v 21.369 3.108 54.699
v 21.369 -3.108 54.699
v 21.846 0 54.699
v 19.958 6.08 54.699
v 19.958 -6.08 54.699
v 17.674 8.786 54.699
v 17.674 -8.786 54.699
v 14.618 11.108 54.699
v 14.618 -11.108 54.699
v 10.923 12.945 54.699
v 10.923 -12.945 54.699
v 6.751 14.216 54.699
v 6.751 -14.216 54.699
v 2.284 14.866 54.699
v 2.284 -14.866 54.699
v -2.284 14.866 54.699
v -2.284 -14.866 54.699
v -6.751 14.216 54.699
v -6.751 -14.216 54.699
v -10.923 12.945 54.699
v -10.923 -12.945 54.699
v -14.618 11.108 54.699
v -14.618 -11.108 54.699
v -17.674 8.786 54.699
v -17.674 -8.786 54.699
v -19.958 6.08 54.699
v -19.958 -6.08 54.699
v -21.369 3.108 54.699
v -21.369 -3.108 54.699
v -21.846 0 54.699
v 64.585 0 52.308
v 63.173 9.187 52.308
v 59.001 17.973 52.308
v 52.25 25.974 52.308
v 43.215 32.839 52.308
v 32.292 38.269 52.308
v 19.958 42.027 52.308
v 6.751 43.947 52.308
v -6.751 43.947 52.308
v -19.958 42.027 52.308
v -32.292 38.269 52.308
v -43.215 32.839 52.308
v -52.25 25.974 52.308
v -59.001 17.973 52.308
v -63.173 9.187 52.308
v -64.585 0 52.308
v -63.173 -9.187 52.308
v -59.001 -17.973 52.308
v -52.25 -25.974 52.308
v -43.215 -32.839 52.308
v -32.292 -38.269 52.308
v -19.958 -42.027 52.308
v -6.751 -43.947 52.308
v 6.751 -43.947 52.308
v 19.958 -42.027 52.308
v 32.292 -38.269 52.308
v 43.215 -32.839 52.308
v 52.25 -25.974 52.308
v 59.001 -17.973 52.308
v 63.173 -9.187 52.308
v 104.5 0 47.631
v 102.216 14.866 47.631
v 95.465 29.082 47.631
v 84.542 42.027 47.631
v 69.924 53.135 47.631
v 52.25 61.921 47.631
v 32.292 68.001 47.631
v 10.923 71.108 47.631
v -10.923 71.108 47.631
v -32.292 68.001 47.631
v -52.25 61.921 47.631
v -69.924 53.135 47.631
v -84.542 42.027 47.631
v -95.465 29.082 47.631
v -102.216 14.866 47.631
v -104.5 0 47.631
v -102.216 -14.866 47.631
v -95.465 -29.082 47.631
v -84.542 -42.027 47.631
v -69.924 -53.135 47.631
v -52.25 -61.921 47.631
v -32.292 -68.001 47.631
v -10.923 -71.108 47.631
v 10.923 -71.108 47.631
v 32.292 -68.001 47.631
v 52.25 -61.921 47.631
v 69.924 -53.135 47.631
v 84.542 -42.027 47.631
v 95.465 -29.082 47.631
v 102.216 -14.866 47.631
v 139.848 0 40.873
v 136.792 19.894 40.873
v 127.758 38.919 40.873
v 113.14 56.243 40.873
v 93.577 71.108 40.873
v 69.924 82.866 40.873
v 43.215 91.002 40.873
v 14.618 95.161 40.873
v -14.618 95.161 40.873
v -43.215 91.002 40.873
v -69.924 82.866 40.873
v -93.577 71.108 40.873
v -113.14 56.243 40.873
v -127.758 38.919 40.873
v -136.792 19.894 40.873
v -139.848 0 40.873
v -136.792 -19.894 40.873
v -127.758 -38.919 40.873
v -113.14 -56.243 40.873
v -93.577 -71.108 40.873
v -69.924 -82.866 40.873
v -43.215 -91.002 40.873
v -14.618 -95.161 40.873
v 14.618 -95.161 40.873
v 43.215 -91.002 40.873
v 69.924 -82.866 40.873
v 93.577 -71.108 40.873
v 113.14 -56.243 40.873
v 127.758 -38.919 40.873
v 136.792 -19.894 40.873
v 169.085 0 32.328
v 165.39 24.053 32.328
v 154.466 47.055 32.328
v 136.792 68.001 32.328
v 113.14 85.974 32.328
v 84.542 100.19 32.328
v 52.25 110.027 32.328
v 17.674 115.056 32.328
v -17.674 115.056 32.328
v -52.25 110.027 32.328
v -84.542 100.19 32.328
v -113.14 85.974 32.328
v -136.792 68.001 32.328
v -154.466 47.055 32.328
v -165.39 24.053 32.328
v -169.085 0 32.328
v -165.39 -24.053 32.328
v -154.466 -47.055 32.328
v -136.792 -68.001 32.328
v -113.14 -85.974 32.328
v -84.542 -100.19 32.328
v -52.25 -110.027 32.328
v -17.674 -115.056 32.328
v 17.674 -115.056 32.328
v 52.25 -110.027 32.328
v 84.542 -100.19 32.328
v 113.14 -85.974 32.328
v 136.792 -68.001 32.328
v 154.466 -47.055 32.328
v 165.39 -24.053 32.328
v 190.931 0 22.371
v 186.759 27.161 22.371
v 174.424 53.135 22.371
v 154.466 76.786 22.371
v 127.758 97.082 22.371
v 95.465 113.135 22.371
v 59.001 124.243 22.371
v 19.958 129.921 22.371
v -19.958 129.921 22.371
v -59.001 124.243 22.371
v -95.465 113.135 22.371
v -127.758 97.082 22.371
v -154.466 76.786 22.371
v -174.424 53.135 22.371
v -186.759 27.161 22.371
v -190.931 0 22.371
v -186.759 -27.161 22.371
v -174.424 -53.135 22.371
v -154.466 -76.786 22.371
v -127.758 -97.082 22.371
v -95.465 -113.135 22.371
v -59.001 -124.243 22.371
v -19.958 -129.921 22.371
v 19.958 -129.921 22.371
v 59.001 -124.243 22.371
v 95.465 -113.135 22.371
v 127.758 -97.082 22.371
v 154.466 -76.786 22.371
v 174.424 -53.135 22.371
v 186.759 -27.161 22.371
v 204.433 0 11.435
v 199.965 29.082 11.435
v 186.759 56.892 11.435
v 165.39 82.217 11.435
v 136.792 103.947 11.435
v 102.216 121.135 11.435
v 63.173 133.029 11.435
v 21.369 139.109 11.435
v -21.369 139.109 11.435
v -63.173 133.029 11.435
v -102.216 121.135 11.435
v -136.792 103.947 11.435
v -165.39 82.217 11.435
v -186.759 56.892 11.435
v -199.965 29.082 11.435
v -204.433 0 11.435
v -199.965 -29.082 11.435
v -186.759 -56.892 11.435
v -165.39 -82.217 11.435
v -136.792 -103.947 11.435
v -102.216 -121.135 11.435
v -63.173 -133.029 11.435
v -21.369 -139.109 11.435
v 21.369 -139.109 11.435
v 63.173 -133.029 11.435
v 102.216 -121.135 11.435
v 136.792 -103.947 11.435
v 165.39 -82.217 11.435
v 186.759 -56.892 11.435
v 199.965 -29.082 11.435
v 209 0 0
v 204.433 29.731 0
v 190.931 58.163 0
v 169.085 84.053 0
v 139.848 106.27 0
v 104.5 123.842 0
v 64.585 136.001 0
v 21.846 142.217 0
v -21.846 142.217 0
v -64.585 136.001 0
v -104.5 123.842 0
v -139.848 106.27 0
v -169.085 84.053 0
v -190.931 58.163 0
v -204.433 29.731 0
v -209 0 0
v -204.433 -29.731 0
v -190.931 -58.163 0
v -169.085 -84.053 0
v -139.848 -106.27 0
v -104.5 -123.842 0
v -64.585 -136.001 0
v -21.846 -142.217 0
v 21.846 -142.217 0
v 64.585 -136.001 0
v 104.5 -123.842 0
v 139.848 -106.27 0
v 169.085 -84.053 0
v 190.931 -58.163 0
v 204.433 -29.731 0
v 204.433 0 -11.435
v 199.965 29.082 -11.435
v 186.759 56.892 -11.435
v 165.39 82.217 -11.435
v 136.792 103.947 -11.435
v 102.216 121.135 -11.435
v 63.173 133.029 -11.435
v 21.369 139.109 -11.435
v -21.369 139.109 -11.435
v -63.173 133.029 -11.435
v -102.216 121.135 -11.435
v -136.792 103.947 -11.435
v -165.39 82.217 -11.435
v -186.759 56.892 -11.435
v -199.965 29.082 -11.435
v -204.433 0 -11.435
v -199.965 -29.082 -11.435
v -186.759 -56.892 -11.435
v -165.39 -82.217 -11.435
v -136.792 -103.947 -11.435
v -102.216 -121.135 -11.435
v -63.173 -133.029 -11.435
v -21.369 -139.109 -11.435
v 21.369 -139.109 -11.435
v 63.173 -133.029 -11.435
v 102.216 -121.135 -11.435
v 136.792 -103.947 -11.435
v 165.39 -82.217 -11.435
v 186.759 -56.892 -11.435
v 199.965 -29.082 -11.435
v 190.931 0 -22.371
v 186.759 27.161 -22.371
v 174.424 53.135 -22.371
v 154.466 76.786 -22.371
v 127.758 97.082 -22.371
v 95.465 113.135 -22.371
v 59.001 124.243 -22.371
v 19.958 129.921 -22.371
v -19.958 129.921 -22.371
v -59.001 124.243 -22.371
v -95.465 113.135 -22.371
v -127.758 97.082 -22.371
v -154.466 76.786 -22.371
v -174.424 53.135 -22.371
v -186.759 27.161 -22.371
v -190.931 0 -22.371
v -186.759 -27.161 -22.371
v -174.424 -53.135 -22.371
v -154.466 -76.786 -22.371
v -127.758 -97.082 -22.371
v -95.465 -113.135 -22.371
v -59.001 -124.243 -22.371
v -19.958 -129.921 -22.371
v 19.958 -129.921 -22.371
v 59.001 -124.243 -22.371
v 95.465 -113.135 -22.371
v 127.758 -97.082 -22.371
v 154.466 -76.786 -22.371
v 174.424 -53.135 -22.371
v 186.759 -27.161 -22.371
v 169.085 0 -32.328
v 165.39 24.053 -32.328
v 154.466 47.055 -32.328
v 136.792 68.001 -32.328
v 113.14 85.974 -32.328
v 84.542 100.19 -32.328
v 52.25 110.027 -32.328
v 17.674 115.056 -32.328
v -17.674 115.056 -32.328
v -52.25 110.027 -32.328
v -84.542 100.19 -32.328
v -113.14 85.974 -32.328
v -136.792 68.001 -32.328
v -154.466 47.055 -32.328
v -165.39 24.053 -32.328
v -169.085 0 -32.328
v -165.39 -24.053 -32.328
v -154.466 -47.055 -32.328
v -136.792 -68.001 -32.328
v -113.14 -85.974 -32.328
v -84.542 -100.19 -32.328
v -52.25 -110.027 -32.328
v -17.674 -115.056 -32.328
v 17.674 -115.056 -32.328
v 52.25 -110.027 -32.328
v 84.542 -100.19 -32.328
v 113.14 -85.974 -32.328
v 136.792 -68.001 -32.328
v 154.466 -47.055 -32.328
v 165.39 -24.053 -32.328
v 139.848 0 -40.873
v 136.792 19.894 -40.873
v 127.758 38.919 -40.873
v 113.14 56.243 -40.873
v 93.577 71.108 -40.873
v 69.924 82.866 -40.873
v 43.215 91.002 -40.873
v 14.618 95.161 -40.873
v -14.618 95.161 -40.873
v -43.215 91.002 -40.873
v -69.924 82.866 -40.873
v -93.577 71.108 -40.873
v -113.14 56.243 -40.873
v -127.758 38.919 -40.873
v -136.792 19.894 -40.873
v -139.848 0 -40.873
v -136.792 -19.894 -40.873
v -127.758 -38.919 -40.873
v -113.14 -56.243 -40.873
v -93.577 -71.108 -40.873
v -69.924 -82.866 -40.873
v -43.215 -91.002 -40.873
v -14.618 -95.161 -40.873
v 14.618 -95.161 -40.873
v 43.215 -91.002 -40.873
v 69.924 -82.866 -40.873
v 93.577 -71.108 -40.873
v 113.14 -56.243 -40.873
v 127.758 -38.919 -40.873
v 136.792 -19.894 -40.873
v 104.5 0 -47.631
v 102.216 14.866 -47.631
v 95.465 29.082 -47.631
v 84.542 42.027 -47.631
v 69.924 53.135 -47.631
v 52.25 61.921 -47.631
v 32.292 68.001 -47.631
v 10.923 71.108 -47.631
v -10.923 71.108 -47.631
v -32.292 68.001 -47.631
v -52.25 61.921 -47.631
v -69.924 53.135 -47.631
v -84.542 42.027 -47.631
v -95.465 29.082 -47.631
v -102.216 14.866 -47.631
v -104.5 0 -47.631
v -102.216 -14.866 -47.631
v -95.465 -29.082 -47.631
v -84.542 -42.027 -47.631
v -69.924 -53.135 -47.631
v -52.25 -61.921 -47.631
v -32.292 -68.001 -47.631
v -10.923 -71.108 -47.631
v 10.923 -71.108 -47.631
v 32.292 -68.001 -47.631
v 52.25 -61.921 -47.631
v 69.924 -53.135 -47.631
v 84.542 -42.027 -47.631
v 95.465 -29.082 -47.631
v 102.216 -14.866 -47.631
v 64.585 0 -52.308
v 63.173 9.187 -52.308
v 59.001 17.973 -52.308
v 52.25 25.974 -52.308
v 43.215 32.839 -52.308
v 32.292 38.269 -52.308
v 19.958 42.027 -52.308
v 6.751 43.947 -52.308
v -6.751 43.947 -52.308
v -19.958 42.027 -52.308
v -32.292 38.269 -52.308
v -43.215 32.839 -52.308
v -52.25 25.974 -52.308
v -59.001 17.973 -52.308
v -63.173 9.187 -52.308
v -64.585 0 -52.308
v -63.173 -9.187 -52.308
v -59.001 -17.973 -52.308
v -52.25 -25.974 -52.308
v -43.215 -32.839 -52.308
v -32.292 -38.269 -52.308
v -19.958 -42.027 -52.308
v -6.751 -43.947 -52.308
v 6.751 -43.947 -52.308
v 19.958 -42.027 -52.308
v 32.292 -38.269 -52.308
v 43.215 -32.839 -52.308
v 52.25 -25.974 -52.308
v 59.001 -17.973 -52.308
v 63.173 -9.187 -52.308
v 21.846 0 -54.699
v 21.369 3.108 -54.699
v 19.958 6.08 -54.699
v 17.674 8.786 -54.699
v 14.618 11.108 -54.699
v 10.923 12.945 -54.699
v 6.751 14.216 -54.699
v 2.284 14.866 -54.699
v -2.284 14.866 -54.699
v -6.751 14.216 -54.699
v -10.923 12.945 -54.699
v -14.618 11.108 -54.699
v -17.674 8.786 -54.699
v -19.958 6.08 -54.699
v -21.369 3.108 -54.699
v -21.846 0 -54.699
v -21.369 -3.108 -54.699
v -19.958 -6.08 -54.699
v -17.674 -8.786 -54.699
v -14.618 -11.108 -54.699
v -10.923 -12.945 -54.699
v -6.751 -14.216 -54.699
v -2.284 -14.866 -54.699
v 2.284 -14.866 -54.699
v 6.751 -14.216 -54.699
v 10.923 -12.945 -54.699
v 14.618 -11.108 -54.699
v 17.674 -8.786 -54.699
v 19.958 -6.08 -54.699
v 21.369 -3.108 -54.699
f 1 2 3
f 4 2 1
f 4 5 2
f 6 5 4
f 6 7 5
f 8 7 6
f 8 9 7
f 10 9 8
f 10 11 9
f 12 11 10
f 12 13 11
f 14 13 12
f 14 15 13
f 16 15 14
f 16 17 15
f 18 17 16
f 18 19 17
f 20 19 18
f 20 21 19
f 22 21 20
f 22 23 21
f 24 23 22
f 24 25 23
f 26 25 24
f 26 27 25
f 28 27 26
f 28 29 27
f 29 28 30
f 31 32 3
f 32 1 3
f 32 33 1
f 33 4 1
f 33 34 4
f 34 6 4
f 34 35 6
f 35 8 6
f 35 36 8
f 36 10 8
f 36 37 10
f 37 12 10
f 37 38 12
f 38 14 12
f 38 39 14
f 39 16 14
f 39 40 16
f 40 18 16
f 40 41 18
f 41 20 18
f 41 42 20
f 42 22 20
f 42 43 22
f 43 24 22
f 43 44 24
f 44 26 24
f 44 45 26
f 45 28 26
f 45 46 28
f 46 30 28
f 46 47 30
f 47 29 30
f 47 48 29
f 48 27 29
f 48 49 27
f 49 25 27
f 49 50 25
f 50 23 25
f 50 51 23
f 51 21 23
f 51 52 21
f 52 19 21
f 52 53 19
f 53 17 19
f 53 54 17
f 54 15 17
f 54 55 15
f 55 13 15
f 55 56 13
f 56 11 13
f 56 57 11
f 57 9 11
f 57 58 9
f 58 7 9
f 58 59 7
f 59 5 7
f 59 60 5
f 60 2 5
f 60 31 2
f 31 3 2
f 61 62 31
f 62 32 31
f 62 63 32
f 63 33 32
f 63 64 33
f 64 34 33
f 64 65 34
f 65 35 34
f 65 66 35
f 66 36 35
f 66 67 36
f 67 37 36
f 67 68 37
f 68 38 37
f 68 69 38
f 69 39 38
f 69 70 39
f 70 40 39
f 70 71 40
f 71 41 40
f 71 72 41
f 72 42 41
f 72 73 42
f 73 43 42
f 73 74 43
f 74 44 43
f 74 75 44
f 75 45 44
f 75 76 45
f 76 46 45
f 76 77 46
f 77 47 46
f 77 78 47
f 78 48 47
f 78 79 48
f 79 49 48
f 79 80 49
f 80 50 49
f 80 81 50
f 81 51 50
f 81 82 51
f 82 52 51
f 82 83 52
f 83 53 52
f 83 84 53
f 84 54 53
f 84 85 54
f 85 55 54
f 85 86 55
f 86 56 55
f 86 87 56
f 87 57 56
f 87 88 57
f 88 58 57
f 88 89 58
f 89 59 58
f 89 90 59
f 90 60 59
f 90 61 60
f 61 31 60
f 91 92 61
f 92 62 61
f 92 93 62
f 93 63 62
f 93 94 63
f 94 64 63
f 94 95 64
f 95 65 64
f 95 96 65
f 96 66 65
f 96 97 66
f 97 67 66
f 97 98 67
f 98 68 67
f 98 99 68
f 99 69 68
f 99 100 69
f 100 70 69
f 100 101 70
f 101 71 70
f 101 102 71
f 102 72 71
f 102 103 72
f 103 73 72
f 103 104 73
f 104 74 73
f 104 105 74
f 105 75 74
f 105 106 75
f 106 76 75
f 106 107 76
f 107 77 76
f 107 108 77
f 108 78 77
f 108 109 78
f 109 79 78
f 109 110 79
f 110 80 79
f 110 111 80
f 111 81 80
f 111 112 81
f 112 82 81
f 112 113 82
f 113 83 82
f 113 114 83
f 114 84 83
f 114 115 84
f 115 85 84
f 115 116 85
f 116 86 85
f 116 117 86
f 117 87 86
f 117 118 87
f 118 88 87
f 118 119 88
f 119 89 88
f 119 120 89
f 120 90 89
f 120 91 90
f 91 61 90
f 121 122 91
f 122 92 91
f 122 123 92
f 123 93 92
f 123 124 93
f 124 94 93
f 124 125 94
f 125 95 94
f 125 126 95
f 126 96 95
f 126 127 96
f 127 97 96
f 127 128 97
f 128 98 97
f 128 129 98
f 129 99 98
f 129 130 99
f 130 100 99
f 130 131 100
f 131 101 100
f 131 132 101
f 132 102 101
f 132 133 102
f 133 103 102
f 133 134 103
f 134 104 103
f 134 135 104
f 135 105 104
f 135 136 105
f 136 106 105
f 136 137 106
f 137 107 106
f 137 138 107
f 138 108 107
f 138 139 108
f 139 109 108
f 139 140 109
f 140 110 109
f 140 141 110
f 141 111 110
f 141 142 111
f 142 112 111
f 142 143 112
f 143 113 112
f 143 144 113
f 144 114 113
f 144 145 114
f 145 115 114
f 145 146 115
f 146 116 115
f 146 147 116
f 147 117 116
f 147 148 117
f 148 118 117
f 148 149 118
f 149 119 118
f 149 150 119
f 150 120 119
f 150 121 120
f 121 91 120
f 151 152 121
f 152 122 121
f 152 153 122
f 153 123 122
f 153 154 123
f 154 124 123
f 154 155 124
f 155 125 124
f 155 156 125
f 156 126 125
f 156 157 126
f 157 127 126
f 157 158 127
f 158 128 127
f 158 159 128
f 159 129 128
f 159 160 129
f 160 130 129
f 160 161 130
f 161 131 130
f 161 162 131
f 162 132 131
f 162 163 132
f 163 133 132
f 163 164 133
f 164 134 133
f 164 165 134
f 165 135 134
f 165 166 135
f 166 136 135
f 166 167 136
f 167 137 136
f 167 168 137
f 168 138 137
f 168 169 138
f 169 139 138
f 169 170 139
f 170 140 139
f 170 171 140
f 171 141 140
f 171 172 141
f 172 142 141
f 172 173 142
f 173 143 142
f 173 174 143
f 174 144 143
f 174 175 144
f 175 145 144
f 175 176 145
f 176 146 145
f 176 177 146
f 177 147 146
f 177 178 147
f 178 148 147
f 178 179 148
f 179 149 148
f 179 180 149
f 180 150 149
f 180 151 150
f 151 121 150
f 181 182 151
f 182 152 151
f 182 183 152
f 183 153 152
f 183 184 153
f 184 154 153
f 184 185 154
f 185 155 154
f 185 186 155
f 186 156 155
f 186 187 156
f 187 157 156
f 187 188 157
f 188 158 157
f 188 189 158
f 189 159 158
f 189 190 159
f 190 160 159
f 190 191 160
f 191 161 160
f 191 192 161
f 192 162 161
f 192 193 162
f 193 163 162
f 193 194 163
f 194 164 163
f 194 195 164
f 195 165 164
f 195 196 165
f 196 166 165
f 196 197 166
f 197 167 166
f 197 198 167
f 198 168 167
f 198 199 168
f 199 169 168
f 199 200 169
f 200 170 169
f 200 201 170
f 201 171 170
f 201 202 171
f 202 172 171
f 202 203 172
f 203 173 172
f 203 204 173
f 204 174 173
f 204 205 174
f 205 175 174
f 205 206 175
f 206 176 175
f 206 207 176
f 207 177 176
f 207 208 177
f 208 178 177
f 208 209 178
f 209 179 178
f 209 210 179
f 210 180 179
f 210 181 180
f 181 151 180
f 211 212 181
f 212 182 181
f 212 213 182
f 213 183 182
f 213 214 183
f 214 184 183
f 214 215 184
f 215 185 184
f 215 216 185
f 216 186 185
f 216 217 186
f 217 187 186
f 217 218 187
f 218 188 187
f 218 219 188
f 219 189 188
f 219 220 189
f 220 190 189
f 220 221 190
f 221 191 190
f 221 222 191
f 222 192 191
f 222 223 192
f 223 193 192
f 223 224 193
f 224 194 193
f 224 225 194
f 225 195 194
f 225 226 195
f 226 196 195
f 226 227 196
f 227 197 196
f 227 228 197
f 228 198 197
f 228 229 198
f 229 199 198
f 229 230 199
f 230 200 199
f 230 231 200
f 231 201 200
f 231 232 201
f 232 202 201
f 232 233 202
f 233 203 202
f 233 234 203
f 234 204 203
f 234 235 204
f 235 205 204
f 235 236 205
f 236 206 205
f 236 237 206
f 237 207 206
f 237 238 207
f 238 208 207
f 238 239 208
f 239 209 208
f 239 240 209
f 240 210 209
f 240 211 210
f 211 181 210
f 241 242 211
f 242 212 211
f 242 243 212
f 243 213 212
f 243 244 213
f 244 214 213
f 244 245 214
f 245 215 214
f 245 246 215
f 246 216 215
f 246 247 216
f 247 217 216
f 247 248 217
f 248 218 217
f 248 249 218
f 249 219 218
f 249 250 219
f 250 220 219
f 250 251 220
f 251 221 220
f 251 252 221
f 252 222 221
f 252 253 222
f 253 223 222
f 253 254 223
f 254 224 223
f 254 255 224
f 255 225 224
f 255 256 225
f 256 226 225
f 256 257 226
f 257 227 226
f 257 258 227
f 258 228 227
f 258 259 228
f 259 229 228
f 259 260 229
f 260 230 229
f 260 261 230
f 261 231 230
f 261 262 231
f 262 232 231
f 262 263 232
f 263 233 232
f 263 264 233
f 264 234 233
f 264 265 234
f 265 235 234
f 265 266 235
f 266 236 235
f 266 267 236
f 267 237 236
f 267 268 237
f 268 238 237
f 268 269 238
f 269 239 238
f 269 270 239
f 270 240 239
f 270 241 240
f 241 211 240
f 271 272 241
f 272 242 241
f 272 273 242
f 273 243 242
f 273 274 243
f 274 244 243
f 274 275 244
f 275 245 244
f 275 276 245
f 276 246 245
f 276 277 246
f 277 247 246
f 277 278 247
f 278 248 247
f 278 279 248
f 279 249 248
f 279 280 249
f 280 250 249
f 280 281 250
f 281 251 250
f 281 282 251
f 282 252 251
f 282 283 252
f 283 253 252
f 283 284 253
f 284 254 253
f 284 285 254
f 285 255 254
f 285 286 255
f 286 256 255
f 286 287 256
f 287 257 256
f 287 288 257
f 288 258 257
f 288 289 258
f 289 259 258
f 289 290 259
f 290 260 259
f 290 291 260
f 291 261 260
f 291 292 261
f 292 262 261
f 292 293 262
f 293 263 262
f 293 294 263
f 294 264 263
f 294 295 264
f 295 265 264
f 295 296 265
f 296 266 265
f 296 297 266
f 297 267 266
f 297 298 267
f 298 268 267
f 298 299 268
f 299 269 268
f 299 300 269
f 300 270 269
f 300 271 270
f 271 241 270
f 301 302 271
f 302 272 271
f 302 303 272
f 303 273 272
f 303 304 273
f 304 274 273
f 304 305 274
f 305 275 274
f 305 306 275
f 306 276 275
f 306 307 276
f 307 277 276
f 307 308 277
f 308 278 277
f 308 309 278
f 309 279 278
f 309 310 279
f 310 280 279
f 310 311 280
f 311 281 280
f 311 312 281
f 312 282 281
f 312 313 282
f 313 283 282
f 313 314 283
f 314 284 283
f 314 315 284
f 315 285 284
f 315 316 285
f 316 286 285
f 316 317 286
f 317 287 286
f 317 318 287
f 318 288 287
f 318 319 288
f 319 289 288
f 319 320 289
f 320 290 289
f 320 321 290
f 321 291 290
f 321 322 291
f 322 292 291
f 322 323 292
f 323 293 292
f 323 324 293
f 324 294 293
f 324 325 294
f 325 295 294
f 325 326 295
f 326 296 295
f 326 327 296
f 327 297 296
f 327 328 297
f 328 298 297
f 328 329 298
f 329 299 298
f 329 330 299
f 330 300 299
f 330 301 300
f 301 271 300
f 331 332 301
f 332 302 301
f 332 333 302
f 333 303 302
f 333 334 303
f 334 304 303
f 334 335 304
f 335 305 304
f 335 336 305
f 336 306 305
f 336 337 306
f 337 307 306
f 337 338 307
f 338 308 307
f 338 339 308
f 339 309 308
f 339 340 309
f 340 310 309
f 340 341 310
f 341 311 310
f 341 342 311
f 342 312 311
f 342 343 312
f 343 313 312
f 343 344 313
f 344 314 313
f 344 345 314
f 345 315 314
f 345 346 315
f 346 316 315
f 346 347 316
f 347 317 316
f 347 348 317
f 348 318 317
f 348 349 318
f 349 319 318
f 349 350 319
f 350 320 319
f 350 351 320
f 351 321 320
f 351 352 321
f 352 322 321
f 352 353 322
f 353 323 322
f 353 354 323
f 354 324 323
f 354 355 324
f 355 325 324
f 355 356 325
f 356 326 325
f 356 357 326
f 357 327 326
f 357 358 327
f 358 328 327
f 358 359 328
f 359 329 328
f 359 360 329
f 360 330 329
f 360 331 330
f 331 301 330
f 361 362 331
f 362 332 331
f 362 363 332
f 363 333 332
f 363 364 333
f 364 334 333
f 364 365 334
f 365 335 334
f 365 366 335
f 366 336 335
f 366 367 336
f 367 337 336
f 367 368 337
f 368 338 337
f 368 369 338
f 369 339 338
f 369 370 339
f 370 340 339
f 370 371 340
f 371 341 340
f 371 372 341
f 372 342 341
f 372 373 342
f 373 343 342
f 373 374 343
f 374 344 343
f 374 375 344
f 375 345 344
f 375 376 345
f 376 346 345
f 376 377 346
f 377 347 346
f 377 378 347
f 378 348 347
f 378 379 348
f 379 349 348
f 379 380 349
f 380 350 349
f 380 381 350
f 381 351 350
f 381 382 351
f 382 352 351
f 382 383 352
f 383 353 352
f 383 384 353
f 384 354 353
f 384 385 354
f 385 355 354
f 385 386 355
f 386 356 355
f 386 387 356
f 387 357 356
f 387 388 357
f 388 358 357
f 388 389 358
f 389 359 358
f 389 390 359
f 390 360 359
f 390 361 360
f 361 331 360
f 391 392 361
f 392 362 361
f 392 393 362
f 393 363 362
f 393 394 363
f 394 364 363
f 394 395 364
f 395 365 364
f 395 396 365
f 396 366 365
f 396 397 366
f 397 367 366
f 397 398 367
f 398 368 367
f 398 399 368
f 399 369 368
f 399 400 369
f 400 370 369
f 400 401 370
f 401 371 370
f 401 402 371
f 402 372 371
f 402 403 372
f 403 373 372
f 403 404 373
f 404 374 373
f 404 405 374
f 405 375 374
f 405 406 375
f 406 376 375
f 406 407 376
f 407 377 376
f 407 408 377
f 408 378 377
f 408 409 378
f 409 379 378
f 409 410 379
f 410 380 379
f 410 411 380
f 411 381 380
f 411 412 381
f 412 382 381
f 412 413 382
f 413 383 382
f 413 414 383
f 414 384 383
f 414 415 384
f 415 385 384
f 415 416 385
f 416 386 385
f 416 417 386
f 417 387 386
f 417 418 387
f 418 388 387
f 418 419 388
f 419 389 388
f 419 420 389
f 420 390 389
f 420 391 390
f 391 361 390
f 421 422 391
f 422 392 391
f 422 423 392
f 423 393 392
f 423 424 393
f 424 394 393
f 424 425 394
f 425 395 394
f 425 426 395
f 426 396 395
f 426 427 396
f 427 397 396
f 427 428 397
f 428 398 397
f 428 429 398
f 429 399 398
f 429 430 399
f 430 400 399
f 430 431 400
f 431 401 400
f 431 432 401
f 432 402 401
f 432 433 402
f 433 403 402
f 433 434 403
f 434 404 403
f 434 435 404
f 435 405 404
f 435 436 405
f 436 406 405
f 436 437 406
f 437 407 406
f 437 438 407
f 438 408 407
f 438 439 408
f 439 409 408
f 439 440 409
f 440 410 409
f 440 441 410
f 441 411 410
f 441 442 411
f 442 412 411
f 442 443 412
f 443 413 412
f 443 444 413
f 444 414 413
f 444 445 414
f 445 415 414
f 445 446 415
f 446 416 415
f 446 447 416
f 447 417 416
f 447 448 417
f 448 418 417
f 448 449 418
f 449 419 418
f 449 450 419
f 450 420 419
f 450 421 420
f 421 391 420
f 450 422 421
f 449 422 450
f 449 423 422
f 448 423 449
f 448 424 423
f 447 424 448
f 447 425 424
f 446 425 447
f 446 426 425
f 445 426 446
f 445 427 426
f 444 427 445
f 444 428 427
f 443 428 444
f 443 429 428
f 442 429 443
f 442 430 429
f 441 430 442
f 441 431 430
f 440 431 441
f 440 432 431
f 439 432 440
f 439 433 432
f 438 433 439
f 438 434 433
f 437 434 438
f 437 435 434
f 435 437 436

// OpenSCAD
// Generated by SolidPython 1.0.1 on 2020-07-29 00:46:54


scale(v = [19, 13, 5]) {
	sphere(r = 11);
}
/***********************************************
*********      SolidPython code:      **********
************************************************
 
# import packages: SolidPython
from solid import *
from solid.utils import *
from itertools import chain, combinations, permutations


class Resize:

    def __init__(self, scad_file):
        self.scad_file = scad_file
        #self.scad_file = import_scad(scad_file)
        # cone/cylinder param:
        self.r1 = 0
        self.r2 = 0
        self.h = 0
        # rectangular prism param:
        self.w = 0
        self.l = 0
        # ellipse param:
        self.r = 0

    # import OpenScad code (file name corresponds to shape)


    # classify shape + parameters
    def assign(self, param1, param2, param3):
        if self.scad_file == 'cone.scad':
            self.r1 = param1
            self.r2 = param2
            self.h = param3
        elif self.scad_file == 'cylinder.scad':
            self.r1 = param1
            self.r2 = param2
            self.h = param3
        elif self.scad_file == 'rectangularPrism.scad':
            self.h = param1
            self.l = param2
            self.w = param3
        else:
            self.r = param1
            self.h = param2

    # resize parameters
    def iterate(self):
        x = range(3, 20, 2)
        i = 1
        if self.scad_file == 'cone.scad':
            tempList = list(permutations(x, 2))
            for temp in tempList:
                param1 = temp[0]
                param2 = temp[1]
                filepath = 'produced_scad_files/' + 'cone' + str(param1) + '_' + str(param2) + '_' + '.scad'
                scad_render_to_file(cylinder(h=param1, r1=param2, r2=0), filepath)

        elif self.scad_file == 'cylinder.scad':
            tempList = list(permutations(x, 3))
            for temp in tempList:
                param1 = temp[0]
                param2 = temp[1]
                filepath = 'produced_scad_files/' + 'cylinder' + str(param1) + '_' + str(param2) + '_' + '.scad'
                scad_render_to_file(cylinder(h=param1, r1=param2, r2=param2), filepath)

        elif self.scad_file == 'rectangularPrism.scad':
            tempList = list(permutations(x, 3))
            for temp in tempList:
                param1 = temp[0]
                param2 = temp[1]
                param3 = temp[2]
                filepath = 'produced_scad_files/' + 'rectangularPrism' + str(param1) + '_' + str(param2) + '_' + str(
                    param3) + '.scad'
                scad_render_to_file(cube(size=(param1, param2, param3)), filepath)

        elif self.scad_file == 'ellipse.scad':
            tempList = list(permutations(x, 4))
            for temp in tempList:
                param1 = temp[0]
                param2 = temp[1]
                param3 = temp[2]
                param4 = temp[3]
                filepath = 'produced_scad_files/' + 'ellipse' + str(param1) + '_' + str(param2) + '_' + str(param3) + '_' + str(param4) + '.scad'
                scad_render_to_file(scale([param1, param2, param3])(sphere(r=param4)), filepath)

    def render_to_scadfile(self):
        scad_render_to_file(scad, 'example.scad') 
 
************************************************/
